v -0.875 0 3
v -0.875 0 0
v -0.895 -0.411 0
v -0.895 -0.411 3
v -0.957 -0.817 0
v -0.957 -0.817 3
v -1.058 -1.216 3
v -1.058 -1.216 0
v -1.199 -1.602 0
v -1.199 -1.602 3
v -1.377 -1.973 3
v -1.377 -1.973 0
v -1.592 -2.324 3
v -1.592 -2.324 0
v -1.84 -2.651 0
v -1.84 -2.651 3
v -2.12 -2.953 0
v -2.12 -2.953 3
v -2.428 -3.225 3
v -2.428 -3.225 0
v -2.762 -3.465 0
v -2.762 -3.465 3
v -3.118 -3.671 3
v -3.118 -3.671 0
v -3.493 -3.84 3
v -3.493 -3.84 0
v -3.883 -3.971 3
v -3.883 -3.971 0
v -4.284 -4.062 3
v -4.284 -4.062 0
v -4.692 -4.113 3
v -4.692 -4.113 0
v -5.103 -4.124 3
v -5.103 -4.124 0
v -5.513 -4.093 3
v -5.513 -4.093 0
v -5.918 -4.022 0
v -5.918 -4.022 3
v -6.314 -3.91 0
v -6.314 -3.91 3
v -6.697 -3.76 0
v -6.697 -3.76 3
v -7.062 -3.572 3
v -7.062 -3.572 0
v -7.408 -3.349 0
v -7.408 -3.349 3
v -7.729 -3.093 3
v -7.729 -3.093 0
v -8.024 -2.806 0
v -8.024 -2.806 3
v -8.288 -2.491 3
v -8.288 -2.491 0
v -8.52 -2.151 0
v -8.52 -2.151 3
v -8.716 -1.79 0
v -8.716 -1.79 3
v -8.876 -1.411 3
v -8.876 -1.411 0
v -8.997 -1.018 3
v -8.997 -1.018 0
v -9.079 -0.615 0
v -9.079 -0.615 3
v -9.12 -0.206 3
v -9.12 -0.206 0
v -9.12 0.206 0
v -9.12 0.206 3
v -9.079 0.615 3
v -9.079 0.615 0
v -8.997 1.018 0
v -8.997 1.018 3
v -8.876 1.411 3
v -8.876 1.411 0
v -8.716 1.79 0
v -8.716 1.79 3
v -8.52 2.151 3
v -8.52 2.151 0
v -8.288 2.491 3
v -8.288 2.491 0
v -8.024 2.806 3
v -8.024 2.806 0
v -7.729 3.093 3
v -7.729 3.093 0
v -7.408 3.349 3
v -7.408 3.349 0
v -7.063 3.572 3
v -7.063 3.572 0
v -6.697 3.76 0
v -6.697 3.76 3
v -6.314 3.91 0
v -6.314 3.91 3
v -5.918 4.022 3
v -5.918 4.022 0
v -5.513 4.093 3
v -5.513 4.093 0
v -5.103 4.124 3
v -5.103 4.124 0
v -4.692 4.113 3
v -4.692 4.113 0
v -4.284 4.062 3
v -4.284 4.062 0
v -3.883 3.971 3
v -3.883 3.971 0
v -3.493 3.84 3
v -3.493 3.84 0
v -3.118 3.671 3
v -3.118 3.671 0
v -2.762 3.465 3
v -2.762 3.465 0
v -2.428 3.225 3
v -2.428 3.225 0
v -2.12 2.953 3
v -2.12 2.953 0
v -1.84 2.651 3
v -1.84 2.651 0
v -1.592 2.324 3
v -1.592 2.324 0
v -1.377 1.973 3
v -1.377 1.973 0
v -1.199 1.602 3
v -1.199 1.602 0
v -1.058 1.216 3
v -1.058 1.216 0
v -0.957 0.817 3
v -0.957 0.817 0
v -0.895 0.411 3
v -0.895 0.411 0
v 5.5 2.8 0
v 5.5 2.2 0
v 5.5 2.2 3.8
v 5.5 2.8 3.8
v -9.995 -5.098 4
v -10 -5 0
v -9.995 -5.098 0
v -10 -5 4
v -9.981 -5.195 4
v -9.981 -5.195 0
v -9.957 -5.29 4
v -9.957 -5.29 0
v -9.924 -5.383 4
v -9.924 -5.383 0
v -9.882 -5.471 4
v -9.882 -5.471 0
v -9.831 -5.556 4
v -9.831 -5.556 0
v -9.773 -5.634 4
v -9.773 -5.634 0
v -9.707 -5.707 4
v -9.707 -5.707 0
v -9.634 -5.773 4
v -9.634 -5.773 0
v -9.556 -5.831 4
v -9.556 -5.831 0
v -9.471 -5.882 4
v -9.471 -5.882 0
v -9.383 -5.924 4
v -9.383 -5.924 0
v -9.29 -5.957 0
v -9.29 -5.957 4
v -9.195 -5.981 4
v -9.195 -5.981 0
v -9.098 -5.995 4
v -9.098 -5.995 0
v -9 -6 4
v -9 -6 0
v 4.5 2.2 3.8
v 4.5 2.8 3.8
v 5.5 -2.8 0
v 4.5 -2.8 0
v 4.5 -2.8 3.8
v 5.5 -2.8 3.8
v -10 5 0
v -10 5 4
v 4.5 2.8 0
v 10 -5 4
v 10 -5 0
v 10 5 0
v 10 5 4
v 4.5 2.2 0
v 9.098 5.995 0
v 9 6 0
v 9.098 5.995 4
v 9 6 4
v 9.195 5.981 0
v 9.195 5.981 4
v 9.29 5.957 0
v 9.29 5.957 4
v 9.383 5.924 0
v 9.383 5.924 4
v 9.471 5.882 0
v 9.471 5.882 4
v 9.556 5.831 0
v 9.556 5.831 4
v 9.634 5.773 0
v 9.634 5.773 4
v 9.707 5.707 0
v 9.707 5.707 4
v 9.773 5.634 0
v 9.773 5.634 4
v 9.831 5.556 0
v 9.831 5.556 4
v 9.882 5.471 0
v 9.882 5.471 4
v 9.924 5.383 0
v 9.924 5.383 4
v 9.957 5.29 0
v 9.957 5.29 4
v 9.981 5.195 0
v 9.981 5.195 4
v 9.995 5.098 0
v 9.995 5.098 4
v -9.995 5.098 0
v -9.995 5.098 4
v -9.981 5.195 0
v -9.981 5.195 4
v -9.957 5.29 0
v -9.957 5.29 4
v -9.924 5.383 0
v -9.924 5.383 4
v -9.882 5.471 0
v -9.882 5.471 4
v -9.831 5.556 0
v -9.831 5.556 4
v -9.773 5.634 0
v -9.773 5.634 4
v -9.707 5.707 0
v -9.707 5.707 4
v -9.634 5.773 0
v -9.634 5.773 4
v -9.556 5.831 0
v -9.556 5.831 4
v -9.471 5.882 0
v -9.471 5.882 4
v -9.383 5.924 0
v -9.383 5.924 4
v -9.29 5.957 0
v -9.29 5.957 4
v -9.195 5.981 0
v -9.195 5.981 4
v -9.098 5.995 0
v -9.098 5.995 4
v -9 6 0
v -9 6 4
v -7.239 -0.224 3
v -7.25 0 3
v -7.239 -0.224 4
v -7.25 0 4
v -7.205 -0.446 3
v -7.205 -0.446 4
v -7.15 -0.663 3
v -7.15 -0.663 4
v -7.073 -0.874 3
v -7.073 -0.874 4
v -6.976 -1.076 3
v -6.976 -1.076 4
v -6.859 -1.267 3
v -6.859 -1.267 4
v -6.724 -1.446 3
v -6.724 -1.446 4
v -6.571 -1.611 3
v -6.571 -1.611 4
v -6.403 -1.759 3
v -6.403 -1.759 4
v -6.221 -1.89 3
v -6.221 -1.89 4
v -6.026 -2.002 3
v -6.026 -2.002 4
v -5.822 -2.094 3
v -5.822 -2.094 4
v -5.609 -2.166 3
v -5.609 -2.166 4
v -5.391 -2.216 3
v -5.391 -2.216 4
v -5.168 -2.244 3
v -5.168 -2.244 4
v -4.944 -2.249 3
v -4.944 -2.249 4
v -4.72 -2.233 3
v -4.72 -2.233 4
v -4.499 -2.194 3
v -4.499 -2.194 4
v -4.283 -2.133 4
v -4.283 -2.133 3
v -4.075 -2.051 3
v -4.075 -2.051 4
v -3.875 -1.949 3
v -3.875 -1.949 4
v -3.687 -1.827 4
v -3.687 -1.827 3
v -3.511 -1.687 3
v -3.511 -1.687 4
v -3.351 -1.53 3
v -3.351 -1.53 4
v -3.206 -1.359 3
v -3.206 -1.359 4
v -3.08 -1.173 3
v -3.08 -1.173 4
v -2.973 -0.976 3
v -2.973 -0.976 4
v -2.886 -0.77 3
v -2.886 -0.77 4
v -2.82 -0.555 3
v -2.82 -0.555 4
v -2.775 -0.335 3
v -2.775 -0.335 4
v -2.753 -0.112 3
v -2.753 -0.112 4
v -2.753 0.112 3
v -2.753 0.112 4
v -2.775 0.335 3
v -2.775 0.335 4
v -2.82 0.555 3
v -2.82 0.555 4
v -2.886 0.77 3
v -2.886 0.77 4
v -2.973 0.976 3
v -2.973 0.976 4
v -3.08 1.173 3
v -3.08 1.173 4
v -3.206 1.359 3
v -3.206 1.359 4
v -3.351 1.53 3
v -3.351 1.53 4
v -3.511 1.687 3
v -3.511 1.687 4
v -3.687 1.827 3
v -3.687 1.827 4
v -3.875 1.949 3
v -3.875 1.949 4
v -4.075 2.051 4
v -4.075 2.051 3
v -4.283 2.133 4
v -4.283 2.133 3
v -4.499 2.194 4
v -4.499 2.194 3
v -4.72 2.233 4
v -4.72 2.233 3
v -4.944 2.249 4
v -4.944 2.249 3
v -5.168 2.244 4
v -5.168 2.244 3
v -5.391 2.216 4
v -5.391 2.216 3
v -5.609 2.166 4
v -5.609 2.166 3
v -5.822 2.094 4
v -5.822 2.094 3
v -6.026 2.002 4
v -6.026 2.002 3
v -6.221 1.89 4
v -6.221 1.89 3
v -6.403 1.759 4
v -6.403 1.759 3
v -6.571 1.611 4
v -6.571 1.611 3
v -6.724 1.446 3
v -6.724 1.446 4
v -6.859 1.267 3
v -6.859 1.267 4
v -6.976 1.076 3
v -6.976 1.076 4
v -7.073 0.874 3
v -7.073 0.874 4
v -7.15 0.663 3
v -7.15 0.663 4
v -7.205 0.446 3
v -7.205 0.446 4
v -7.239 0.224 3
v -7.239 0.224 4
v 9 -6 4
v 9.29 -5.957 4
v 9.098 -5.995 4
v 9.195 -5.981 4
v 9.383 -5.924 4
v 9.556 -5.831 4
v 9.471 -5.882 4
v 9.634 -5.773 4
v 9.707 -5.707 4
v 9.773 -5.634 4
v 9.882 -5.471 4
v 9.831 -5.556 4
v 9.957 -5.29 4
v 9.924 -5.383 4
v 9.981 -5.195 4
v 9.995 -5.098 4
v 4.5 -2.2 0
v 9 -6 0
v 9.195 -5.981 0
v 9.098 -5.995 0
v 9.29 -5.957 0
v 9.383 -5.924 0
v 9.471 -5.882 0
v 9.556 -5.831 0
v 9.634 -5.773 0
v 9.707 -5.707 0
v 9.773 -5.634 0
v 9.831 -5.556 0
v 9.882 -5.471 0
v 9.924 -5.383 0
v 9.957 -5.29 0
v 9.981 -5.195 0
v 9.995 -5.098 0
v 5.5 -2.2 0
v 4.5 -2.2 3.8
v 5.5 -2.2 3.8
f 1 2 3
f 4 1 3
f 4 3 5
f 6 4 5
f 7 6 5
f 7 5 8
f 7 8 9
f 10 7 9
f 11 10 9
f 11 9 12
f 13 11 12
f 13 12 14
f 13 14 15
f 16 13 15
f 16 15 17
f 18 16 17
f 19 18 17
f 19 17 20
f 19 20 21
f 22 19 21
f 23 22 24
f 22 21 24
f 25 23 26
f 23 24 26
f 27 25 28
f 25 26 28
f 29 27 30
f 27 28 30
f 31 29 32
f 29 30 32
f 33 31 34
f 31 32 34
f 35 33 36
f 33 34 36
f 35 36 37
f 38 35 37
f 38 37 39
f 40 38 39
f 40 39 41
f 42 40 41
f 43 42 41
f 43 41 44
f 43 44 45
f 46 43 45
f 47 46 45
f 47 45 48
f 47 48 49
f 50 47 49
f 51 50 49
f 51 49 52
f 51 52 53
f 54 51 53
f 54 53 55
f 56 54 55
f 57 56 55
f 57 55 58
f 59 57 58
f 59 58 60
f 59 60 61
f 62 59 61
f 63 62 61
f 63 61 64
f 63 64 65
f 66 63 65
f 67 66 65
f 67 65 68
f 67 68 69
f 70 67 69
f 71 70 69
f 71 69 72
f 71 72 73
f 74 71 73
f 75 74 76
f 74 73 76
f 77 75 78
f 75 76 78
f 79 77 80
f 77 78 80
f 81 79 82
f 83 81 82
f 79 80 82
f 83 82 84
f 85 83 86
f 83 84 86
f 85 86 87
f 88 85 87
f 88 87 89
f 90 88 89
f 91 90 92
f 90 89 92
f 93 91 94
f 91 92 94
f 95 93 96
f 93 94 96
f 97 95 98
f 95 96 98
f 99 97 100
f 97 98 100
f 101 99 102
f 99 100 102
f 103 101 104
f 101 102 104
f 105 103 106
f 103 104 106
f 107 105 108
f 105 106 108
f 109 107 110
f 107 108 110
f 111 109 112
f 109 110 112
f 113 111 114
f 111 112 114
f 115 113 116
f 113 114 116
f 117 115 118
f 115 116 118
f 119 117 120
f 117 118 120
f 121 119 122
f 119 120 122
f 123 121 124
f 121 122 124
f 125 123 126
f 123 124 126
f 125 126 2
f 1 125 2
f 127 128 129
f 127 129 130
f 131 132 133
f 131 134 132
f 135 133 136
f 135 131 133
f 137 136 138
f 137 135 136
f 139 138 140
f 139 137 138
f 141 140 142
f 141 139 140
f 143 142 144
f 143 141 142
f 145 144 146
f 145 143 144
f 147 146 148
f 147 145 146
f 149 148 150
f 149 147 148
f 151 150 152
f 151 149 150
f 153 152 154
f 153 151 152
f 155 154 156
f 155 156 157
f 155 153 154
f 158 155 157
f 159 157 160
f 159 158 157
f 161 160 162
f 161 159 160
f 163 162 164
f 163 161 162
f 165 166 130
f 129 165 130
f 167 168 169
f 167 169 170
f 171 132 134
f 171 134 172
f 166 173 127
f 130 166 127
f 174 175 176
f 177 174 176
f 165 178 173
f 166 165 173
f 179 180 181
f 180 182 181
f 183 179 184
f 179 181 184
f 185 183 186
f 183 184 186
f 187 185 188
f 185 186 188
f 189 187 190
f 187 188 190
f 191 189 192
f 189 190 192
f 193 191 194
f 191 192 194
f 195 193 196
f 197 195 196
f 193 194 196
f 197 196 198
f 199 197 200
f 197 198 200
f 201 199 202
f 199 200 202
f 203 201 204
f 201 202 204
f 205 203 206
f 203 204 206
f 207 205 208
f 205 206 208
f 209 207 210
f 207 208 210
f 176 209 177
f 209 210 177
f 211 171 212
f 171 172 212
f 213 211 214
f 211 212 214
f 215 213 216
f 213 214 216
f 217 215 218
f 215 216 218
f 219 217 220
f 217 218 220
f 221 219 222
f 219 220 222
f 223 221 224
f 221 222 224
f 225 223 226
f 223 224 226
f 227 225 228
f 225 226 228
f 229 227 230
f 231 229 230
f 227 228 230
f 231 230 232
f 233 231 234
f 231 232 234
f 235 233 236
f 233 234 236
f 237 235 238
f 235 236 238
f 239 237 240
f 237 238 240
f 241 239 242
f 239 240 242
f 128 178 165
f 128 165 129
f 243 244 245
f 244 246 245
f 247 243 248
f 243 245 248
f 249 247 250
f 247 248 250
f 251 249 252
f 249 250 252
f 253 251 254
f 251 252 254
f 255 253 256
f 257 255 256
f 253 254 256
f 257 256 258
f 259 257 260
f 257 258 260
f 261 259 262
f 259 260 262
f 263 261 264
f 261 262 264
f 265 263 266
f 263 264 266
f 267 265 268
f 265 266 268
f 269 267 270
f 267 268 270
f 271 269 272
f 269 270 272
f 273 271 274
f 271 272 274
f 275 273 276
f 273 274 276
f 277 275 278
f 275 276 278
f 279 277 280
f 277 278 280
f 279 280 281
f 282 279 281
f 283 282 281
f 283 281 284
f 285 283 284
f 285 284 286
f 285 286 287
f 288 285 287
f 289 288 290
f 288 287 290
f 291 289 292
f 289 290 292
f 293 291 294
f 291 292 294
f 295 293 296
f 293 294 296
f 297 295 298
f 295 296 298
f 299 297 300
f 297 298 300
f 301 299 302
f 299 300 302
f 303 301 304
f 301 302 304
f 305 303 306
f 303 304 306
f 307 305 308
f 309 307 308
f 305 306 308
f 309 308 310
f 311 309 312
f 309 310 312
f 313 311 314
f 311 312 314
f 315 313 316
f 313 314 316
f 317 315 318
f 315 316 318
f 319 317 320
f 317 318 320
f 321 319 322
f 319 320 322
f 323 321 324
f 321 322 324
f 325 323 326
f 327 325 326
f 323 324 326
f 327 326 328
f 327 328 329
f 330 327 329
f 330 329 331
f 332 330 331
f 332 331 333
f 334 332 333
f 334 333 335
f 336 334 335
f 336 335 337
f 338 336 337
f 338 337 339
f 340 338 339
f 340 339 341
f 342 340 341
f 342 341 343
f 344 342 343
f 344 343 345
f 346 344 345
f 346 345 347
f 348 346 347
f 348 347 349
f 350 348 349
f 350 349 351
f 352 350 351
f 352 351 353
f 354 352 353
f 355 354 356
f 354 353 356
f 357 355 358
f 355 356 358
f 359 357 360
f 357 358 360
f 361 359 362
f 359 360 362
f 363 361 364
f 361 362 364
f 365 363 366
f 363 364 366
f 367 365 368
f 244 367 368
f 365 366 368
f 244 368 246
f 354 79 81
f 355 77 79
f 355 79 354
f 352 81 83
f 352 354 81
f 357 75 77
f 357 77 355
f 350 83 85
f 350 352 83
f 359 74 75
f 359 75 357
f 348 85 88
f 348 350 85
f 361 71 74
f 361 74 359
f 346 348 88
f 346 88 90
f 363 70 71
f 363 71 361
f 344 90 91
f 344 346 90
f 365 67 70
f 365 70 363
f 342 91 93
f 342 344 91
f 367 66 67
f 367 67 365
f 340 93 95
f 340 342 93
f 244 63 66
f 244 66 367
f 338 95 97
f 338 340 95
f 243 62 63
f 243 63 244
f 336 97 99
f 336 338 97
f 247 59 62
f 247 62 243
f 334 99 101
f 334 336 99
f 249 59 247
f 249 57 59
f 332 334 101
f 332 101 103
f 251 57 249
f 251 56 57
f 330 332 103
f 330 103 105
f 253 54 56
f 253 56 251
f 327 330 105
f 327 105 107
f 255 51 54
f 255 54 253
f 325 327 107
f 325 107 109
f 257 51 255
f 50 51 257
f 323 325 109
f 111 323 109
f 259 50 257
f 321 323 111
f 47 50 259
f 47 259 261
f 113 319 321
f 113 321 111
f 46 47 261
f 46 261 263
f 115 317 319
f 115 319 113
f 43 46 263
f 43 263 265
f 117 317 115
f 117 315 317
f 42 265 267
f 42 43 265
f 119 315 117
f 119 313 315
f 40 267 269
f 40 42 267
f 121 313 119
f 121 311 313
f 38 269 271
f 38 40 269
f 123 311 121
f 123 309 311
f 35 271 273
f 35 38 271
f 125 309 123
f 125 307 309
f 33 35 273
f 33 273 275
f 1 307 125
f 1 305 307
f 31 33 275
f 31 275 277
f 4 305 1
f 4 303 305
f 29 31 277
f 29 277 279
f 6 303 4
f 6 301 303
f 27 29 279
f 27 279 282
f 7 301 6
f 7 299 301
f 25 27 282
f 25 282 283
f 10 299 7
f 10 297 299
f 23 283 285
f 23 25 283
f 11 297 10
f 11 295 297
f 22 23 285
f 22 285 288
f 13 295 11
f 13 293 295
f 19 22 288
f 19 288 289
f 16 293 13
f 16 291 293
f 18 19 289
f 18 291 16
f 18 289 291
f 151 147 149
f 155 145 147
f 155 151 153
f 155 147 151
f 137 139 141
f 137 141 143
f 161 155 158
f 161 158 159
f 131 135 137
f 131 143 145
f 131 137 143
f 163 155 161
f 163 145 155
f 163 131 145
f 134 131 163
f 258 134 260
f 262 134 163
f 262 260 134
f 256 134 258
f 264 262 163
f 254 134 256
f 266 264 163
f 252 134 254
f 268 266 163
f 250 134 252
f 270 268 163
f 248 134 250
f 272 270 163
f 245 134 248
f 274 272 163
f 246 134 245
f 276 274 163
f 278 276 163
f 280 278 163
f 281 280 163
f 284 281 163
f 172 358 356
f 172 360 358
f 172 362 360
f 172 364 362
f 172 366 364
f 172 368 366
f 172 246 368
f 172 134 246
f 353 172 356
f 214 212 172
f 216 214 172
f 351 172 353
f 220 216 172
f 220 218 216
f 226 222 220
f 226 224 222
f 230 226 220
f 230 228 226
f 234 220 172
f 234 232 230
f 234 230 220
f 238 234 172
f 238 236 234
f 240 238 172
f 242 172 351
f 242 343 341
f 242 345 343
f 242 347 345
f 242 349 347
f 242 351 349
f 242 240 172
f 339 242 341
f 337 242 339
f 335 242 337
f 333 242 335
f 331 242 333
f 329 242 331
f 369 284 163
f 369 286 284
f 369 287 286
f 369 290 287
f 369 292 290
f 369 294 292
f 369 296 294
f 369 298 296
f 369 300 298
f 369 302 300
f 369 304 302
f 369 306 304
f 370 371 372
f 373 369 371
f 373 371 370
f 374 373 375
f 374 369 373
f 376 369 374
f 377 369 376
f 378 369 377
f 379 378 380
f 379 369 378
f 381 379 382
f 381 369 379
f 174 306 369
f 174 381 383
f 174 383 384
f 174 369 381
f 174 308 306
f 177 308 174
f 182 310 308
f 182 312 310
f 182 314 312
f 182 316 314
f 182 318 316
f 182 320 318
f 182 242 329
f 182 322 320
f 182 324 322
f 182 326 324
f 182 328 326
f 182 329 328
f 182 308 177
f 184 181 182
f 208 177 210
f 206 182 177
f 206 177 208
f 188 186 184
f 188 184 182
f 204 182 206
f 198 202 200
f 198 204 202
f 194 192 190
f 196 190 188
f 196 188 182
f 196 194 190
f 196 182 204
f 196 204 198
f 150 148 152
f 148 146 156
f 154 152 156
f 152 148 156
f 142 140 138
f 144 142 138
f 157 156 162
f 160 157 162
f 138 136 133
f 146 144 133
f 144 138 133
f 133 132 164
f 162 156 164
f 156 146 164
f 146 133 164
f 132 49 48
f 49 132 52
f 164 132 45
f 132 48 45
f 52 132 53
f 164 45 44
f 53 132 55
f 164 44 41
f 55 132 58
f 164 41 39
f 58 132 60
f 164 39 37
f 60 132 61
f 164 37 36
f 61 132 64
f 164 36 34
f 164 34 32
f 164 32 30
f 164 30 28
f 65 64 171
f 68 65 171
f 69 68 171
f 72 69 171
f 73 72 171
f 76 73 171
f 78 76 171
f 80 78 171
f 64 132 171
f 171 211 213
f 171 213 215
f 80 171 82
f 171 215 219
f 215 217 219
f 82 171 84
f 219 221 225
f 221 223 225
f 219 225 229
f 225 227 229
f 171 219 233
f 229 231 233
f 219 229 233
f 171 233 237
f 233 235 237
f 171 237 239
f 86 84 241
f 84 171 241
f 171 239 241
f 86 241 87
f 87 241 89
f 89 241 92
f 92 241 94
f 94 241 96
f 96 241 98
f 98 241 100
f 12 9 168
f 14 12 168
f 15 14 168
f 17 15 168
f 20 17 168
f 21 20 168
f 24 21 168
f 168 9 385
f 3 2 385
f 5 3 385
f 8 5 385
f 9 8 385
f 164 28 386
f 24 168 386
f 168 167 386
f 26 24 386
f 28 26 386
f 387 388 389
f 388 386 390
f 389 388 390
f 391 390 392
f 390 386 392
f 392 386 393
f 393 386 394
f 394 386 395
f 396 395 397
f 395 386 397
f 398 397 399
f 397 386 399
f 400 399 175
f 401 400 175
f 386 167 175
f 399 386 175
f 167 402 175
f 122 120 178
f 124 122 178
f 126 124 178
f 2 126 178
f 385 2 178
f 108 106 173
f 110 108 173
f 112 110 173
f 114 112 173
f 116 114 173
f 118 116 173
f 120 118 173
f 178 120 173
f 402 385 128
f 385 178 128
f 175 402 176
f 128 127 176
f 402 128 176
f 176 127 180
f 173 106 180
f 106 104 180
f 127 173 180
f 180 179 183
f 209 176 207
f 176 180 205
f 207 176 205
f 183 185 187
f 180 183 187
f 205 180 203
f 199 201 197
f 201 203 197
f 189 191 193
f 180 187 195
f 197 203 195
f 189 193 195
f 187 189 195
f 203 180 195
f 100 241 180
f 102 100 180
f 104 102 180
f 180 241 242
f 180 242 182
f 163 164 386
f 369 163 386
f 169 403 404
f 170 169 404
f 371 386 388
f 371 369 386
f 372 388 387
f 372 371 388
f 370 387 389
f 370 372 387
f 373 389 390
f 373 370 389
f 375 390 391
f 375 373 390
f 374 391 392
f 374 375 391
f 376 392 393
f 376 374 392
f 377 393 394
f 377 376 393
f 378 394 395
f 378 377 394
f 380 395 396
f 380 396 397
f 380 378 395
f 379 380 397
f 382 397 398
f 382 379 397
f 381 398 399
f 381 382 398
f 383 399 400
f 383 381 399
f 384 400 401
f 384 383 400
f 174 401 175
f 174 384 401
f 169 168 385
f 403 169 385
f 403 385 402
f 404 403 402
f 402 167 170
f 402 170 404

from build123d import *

# Parameters (mm, degrees)
F0_W           = 20
F0_H           = 12
F0_W_2         = 1
F0_H_2         = 0.6
F1_DEPTH       = 4
F2_D           = 4.5
F2_CBORE_D     = 8.25
F2_CBORE_DEPTH = 3
F3_R           = 1
F4_DEPTH       = 3.8


with BuildPart() as f1:
    # F0 (on Top) → F1 (new body)
    with BuildSketch(Plane.XY):
        Rectangle(F0_W, F0_H)
        with Locations((5, -2.5)):
            Rectangle(F0_W_2, F0_H_2, mode=Mode.SUBTRACT)
        with Locations((5, 2.5)):
            Rectangle(F0_W_2, F0_H_2, mode=Mode.SUBTRACT)
        with Locations((5, -2.5)):
            Rectangle(F0_W_2, F0_H_2)
        with Locations((5, 2.5)):
            Rectangle(F0_W_2, F0_H_2)
    extrude(amount=F1_DEPTH)

    # F2 (through all)
    with Locations(Plane(origin=(0, 0, 0), x_dir=(1, 0, 0), z_dir=(0, 0, -1))):
        with Locations((-5, 0)):
            CounterBoreHole(F2_D / 2, F2_CBORE_D / 2, F2_CBORE_DEPTH)

    # F3
    f3_edges = [f1.edges().sort_by_distance(p)[0] for p in [
        (-10, 6, 2),
        (10, 6, 2),
        (-10, -6, 2),
        (10, -6, 2),
    ]]
    fillet(f3_edges, radius=F3_R)

    # F0 (on Top) → F4 (cut)
    with BuildSketch(Plane.XY):
        with Locations((5, -2.5)):
            Rectangle(F0_W_2, F0_H_2)
        with Locations((5, 2.5)):
            Rectangle(F0_W_2, F0_H_2)
    extrude(amount=F4_DEPTH, mode=Mode.SUBTRACT)


solid = f1.part
